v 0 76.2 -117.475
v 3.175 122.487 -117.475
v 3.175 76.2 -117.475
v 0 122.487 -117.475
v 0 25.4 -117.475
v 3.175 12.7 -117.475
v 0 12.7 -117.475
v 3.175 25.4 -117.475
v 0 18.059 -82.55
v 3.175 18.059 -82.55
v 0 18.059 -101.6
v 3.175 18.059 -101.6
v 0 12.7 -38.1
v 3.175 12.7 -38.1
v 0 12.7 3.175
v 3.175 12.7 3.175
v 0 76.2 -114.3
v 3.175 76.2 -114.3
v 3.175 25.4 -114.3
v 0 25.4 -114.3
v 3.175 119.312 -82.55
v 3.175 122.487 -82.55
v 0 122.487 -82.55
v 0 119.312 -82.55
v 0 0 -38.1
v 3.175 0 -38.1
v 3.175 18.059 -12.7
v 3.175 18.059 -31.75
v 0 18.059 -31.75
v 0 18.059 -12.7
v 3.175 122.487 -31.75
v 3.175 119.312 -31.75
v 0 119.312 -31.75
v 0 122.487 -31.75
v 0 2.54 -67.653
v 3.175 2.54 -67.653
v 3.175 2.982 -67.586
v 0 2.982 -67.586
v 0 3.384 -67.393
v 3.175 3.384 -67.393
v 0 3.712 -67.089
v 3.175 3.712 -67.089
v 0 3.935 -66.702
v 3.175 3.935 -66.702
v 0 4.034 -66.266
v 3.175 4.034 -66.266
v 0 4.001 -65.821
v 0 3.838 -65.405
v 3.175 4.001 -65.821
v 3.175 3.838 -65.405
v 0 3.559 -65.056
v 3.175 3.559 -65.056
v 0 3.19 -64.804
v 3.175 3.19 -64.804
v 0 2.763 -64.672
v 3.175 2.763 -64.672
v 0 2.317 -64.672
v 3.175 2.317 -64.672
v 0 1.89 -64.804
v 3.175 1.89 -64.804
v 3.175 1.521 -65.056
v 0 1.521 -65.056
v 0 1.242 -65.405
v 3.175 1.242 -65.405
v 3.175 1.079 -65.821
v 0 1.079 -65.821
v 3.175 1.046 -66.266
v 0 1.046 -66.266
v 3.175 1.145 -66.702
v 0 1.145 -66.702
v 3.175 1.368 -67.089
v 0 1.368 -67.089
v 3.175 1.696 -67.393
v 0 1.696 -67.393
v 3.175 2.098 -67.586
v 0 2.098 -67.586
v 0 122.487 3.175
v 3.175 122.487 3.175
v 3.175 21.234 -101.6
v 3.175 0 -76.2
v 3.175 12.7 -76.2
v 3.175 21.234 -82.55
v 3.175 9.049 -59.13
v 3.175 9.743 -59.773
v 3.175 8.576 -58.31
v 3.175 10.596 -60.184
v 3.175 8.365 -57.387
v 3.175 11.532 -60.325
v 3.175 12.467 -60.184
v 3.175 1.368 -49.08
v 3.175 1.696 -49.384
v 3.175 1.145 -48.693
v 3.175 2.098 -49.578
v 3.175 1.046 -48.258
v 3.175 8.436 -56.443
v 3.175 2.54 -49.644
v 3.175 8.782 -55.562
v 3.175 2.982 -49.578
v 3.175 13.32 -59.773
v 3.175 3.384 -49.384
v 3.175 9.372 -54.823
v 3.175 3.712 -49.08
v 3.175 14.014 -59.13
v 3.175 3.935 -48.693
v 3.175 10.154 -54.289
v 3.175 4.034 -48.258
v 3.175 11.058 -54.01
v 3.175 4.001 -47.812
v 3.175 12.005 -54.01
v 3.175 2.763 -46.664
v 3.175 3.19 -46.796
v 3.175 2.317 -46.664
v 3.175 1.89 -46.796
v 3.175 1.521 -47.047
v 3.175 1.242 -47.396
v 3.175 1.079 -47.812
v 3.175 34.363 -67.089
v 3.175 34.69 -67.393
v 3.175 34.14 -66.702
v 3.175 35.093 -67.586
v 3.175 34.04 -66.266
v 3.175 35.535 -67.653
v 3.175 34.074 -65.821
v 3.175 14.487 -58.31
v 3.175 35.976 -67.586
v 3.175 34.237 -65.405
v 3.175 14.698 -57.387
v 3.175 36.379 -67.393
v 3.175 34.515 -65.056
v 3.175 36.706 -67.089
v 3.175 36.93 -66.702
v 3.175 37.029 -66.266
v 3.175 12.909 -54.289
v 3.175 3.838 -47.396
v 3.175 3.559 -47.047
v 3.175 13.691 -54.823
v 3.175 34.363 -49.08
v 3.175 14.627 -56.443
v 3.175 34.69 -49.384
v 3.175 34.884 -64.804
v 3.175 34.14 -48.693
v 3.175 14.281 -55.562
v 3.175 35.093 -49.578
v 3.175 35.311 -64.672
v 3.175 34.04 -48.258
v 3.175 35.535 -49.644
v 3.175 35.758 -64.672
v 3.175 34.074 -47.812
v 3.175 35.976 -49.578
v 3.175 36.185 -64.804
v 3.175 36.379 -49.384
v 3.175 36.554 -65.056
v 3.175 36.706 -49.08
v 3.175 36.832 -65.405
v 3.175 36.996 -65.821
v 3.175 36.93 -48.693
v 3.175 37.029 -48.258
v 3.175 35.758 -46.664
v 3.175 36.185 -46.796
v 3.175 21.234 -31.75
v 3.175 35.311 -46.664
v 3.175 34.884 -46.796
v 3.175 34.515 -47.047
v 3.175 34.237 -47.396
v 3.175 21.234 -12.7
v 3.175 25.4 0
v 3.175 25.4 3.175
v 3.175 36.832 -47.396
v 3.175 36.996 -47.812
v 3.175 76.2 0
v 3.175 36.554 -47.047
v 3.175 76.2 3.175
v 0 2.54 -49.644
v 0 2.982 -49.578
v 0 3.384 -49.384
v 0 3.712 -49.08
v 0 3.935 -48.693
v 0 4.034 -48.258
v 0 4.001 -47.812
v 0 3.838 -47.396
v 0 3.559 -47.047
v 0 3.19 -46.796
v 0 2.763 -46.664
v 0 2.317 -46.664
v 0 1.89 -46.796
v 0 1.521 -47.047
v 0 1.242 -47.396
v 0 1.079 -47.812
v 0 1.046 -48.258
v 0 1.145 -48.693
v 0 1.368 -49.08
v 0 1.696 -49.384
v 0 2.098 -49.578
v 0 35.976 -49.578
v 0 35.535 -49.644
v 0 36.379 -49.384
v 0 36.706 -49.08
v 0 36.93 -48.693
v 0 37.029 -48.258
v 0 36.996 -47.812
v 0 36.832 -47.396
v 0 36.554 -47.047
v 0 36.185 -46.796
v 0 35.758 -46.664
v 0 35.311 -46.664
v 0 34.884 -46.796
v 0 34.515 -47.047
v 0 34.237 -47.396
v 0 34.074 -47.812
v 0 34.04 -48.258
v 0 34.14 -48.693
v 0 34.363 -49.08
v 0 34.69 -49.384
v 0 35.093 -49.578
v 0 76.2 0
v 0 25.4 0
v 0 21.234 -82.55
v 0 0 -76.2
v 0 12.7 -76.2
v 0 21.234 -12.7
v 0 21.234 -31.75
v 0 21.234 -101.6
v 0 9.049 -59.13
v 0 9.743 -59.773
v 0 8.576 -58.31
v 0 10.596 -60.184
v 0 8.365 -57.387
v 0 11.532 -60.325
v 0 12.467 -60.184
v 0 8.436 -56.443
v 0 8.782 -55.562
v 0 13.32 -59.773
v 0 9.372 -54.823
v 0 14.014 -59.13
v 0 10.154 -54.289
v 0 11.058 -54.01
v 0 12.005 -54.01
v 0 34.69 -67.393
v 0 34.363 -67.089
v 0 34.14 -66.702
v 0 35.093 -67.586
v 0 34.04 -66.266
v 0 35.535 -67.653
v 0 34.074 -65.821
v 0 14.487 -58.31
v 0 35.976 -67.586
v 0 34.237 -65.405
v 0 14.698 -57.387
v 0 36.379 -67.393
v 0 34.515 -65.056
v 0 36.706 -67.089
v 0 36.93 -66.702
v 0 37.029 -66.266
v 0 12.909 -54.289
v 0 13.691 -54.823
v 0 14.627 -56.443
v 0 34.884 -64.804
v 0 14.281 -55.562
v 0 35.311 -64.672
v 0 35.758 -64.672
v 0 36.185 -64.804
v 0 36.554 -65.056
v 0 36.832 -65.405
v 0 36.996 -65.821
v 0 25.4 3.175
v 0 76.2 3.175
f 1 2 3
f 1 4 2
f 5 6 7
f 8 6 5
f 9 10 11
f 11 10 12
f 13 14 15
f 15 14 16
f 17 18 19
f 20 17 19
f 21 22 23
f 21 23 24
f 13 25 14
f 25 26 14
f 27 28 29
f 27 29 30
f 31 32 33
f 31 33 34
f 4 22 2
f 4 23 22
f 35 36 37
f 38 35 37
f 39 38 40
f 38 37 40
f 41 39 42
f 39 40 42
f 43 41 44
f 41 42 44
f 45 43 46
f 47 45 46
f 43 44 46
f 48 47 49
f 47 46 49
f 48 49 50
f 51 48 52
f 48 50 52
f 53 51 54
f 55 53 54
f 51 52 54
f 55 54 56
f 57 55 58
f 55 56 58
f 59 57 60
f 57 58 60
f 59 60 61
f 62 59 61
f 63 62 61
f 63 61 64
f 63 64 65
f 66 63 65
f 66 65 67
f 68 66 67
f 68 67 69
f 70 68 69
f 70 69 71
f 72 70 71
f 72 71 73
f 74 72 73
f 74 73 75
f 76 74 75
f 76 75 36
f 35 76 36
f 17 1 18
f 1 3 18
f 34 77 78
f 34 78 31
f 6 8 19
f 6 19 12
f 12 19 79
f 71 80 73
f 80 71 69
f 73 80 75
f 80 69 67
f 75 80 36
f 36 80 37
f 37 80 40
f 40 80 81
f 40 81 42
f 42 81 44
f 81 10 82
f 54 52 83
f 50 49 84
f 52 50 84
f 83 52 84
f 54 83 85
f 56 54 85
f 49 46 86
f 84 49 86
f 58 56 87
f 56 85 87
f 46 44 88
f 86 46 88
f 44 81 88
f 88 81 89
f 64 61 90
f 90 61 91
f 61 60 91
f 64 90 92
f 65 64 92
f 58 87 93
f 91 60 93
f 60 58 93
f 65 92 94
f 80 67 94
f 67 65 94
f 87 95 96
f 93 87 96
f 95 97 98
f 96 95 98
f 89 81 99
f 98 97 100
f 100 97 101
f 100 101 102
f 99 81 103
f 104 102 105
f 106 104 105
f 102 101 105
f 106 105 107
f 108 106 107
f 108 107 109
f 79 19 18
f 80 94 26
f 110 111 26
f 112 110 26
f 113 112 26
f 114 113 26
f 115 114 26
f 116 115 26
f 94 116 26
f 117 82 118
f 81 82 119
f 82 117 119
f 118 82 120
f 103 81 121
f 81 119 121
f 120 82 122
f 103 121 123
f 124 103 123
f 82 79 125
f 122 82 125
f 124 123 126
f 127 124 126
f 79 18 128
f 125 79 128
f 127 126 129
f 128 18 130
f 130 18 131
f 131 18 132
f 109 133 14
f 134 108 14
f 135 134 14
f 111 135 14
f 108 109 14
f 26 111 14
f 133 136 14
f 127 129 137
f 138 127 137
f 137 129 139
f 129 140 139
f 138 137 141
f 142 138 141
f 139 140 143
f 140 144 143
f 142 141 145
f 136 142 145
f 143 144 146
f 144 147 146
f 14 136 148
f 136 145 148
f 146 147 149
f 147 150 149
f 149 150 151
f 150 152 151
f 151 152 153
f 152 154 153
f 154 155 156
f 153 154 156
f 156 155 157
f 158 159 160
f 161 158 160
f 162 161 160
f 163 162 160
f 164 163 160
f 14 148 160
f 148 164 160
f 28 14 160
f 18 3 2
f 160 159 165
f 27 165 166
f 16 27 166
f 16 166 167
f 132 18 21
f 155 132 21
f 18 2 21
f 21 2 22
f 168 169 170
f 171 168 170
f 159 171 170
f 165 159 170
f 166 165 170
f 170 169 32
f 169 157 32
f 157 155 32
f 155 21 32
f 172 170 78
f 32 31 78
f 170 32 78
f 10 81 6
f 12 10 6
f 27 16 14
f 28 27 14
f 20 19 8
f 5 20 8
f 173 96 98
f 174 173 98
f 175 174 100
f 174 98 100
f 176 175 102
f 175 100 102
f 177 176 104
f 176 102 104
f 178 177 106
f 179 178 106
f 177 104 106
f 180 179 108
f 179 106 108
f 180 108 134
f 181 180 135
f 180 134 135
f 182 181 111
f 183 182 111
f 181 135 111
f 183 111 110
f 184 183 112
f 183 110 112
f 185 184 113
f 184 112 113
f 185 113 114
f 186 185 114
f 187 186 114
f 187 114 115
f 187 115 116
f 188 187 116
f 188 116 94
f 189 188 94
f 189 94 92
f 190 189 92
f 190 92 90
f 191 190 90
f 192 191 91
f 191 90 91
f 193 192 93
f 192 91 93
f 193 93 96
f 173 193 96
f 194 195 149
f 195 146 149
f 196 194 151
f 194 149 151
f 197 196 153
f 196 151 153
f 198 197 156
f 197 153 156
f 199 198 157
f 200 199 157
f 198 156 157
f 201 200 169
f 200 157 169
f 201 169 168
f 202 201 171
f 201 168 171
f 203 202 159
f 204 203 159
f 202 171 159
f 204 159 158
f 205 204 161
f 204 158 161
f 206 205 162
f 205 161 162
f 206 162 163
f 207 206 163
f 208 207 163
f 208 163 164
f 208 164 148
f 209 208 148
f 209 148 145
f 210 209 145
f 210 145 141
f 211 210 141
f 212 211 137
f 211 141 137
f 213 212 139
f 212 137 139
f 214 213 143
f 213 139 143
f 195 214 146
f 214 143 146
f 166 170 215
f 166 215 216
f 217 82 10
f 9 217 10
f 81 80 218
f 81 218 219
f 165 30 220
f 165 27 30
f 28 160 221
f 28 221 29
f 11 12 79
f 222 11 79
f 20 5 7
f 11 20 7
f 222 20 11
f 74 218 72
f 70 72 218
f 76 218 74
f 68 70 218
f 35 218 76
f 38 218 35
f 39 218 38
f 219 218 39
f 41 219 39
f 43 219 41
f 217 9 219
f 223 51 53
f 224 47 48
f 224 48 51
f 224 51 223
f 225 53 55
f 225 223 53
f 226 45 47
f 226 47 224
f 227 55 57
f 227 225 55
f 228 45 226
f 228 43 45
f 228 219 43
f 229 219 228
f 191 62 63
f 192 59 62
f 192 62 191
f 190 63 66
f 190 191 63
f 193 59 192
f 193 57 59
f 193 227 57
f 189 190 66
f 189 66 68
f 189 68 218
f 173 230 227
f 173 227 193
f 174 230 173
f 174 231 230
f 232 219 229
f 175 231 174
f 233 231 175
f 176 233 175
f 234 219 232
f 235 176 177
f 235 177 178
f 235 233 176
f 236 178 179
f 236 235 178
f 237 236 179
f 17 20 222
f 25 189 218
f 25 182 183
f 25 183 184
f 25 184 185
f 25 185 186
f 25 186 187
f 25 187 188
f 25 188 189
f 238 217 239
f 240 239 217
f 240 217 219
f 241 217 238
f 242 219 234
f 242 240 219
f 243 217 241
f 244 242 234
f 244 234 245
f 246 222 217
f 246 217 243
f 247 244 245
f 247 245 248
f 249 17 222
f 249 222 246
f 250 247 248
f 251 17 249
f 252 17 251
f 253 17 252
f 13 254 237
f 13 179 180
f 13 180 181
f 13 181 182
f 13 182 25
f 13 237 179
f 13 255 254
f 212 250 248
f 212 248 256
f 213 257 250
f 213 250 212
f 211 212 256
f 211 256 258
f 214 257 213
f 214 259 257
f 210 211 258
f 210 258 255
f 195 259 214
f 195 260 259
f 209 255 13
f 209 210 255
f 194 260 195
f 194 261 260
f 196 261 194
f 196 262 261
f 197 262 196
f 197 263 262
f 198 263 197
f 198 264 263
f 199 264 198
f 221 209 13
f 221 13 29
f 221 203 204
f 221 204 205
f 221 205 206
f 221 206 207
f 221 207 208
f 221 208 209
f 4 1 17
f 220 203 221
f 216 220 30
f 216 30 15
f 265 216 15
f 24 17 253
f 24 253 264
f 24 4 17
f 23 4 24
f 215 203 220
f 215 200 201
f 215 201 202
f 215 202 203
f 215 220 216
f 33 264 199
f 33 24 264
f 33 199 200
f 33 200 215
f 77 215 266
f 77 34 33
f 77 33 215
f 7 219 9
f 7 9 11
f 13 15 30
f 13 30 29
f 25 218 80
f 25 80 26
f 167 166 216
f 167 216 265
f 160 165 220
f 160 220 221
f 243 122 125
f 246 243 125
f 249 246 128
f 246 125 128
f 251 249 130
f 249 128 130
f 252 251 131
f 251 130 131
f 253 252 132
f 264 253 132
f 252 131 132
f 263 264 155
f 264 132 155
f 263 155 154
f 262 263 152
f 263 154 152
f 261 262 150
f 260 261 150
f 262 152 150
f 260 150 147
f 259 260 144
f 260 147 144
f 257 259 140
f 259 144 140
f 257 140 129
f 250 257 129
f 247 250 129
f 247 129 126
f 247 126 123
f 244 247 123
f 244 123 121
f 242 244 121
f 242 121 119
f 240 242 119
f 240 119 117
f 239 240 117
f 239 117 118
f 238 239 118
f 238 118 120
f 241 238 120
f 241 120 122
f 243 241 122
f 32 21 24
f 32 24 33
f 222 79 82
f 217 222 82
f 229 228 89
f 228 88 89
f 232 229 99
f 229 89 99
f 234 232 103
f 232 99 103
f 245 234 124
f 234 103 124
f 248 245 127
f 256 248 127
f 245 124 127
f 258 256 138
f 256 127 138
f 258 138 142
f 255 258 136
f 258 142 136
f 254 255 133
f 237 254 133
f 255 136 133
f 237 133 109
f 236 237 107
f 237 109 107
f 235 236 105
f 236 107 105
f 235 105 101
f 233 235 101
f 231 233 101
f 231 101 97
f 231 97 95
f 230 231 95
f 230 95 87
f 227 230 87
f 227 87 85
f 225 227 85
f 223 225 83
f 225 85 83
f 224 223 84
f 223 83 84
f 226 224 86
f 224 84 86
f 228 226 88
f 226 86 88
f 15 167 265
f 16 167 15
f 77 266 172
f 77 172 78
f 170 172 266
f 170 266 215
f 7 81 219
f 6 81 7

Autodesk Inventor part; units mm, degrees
ref_plane "YZ Plane" through (0, 0, 0) normal (1, 0, 0) x (0, 1, 0)
ref_plane "XZ Plane" through (0, 0, 0) normal (0, 1, 0) x (-1, 0, 0)
ref_plane "XY Plane" through (0, 0, 0) normal (0, 0, 1) x (1, 0, 0)
sketch "Sketch1" plane through (0, 0, 0) normal (1, 0, 0) x (0, 1, 0)
  line L0 (0, 0) -> (97.4344, 0)
  line L1 (97.4344, 0) -> (97.4344, -114.3)
  line L2 (97.4344, -114.3) -> (0, -114.3)
  line L3 (0, -114.3) -> (0, 0)
  dimension "d0" = 114.3
  dimension "d1" = 97.4344
extrude "Extrusion1" add sketch "Sketch1" along normal blind 3.175
sketch "Sketch2" plane through (3.175, 0, 0) normal (1, 0, 0) x (0, 0, -1)
  circle A0 centre (48.1457, 35.5346) radius 1.4986
  circle A1 centre (66.1543, 35.5346) radius 1.4986
  circle A2 centre (66.1543, 2.54) radius 1.4986
  circle A3 centre (48.1457, 2.54) radius 1.4986
  line L0 (114.3, 0) -> (114.3, 97.4344) projected
  line L1 (0, 0) -> (114.3, 0) projected
  line L2 (0, 0) -> (0, 97.4344) projected
  dimension "d4" = 18.0086
  dimension "d5" = 2.9972
  dimension "d6" = 2.9972
  dimension "d7" = 2.9972
  dimension "d8" = 2.9972
  dimension "d11" = 18.0086
  dimension "d12" = 2.54
  dimension "d28" = 2.54
  dimension "d29" = 32.9946
  dimension "d30" = 32.9946
  dimension "d65" = 48.1457
extrude "Extrusion2" cut sketch "Sketch2" against normal blind 3.175
sketch "Sketch3" plane through (3.175, 0, 0) normal (1, 0, 0) x (0, 0, -1)
  circle A0 centre (57.15, 11.5316) radius 3.175
  line L0 (114.3, 0) -> (114.3, 97.4344) projected
  circle A1 centre (66.1543, 2.54) radius 1.4986 projected
  point P0 (0, 0)
  dimension "d15" = 6.35
  dimension "d16" = 57.15
  dimension "d17" = 8.9916
extrude "Extrusion3" cut sketch "Sketch3" against normal blind 3.175 contours A0
sketch "Sketch4" plane through (3.175, 0, 0) normal (1, 0, 0) x (0, 0, -1)
  line L0 (0, 97.4344) -> (0, 0) projected
  line L1 (0, 0) -> (114.3, 0) projected
  line L2 (114.3, 0) -> (114.3, 97.4344) projected
  line L3 (31.75, 18.0594) -> (12.7, 18.0594)
  line L4 (12.7, 18.0594) -> (12.7, 21.2344)
  line L5 (12.7, 21.2344) -> (31.75, 21.2344)
  line L6 (31.75, 21.2344) -> (31.75, 18.0594)
  circle A0 centre (57.15, 11.5316) radius 3.175 projected
  line L7 (57.15, 11.5316) -> (57.15, 79.1299) construction
  line L8 (82.55, 18.0594) -> (101.6, 18.0594)
  line L9 (101.6, 18.0594) -> (101.6, 21.2344)
  line L10 (101.6, 21.2344) -> (82.55, 21.2344)
  line L11 (82.55, 21.2344) -> (82.55, 18.0594)
  point P0 (12.7, 0)
  point P1 (31.75, 0)
  point P2 (101.6, 0)
  dimension "d31" = 3.175
  dimension "d33" = 19.05
  dimension "d34" = 12.7
  dimension "d43" = 18.0594
extrude "Extrusion5" cut sketch "Sketch4" against normal blind 3.175 contours L3 L4 L5 L6 | L11 L10 L9 L8
sketch "Sketch5" plane through (3.175, 0, 0) normal (1, 0, 0) x (0, 0, -1)
  line L0 (0, 0) -> (38.1, 0)
  line L1 (38.1, 0) -> (38.1, 12.7)
  line L2 (38.1, 12.7) -> (0, 12.7)
  line L3 (0, 12.7) -> (0, 0)
  line L4 (114.3, 0) -> (0, 0) projected
  line L5 (114.3, 0) -> (76.2, 0)
  line L6 (76.2, 0) -> (76.2, 12.7)
  line L7 (76.2, 12.7) -> (114.3, 12.7)
  line L8 (114.3, 12.7) -> (114.3, 0)
  dimension "d37" = 38.1
  dimension "d38" = 12.7
  dimension "d39" = 38.1
  dimension "d42" = 12.7
extrude "Extrusion6" cut sketch "Sketch5" against normal blind 3.175
sketch "Sketch6" plane through (3.175, 0, 0) normal (1, 0, 0) x (0, 0, -1)
  line L0 (0, 97.4344) -> (0, 12.7) projected
  line L1 (0, 69.85) -> (3.175, 69.85)
  line L2 (3.175, 69.85) -> (3.175, 50.8)
  line L3 (3.175, 50.8) -> (0, 50.8)
  line L4 (0, 50.8) -> (0, 69.85)
  line L5 (0, 12.7) -> (38.1, 12.7) projected
  line L6 (38.1, 0) -> (76.2, 0) projected
  line L7 (57.15, 0) -> (57.15, 76.8026) construction
  line L8 (114.3, 97.4344) -> (114.3, 12.7)
  line L9 (114.3, 69.85) -> (111.125, 69.85)
  line L10 (111.125, 69.85) -> (111.125, 50.8)
  line L11 (111.125, 50.8) -> (114.3, 50.8)
  line L12 (114.3, 50.8) -> (114.3, 69.85)
  point P0 (0, 0)
  dimension "d44" = 38.1
  dimension "d45" = 19.05
  dimension "d46" = 3.175
extrude "Extrusion7" cut sketch "Sketch6" against normal blind 3.175
sketch "Sketch7" plane through (3.175, 0, 0) normal (1, 0, 0) x (0, 0, -1)
  line L0 (0, 101.4731) -> (-3.175, 101.4731)
  line L1 (-3.175, 101.4731) -> (-3.175, 12.7)
  line L2 (-3.175, 12.7) -> (0, 12.7)
  line L3 (0, 12.7) -> (0, 101.4731)
  line L4 (114.3, 50.8) -> (114.3, 12.7) projected
  line L5 (114.3, 12.7) -> (117.475, 12.7)
  line L6 (117.475, 12.7) -> (117.475, 101.4731)
  line L7 (117.475, 101.4731) -> (114.3, 101.4731)
  line L8 (114.3, 101.4731) -> (114.3, 12.7)
  line L9 (0, 97.4344) -> (0, 69.85) projected
  line L10 (0, 69.85) -> (3.3446, 69.85)
  line L11 (3.3446, 69.85) -> (3.3446, 50.8)
  line L12 (3.3446, 50.8) -> (0, 50.8)
  line L13 (0, 50.8) -> (0, 69.85)
  line L14 (111.125, 69.85) -> (111.125, 50.8) projected
  line L15 (111.125, 69.85) -> (114.3, 69.85)
  line L16 (114.3, 69.85) -> (114.3, 50.8)
  line L17 (114.3, 50.8) -> (111.125, 50.8)
  line L18 (111.125, 50.8) -> (111.125, 69.85)
  line L19 (0, 97.4344) -> (-3.175, 97.4344)
  line L20 (0, 97.4344) -> (114.3, 97.4344) projected
  line L21 (114.3, 97.4344) -> (117.475, 97.4344)
  point P0 (0, 0)
  dimension "d49" = 3.175
  dimension "d50" = 3.175
  dimension "d51" = 0
extrude "Extrusion8" add sketch "Sketch7" against normal blind 3.175
sketch "Sketch8" plane through (3.175, 0, 0) normal (1, 0, 0) x (0, 0, -1)
  line L0 (-3.175, 101.4731) -> (-3.175, 12.7) projected
  line L1 (-3.175, 76.2) -> (0, 76.2)
  line L2 (0, 76.2) -> (0, 25.4)
  line L3 (0, 25.4) -> (-3.175, 25.4)
  line L4 (-3.175, 25.4) -> (-3.175, 76.2)
  line L5 (117.475, 101.4731) -> (117.475, 12.7) projected
  line L6 (117.475, 76.2) -> (114.3, 76.2)
  line L7 (114.3, 76.2) -> (114.3, 25.4)
  line L8 (114.3, 25.4) -> (117.475, 25.4)
  line L9 (117.475, 25.4) -> (117.475, 76.2)
  line L10 (-3.175, 12.7) -> (38.1, 12.7) projected
  point P0 (0, 0)
  dimension "d54" = 3.175
  dimension "d55" = 3.175
  dimension "d56" = 50.8
  dimension "d57" = 50.8
  dimension "d58" = 12.7
extrude "Extrusion9" cut sketch "Sketch8" against normal blind 3.175
sketch "Sketch9" plane through (3.175, 0, 0) normal (1, 0, 0) x (0, 0, -1)
  line L0 (-3.175, 76.2) -> (-3.175, 101.4731) projected
  line L1 (-3.175, 97.0871) -> (127.7131, 97.0871)
  line L2 (127.7131, 97.0871) -> (127.7131, 110.1997)
  line L3 (127.7131, 110.1997) -> (-3.175, 110.1997)
  line L4 (-3.175, 110.1997) -> (-3.175, 97.0871)
  point P0 (0, 0)
extrude "Extrusion10" cut sketch "Sketch9" against normal blind 3.175
sketch "Sketch10" plane through (0, 0, 0) normal (-1, 0, 0) x (0, 0, 1)
  line L0 (-117.475, 97.0871) -> (-117.475, 76.2) projected
  line L1 (-117.475, 97.0871) -> (3.175, 97.0871)
  line L2 (3.175, 97.0871) -> (3.175, 122.4871)
  line L3 (3.175, 122.4871) -> (-117.475, 122.4871)
  line L4 (-117.475, 122.4871) -> (-117.475, 97.0871)
  line L5 (3.175, 76.2) -> (3.175, 97.0871) projected
  point P0 (0, 0)
  dimension "d66" = 0
  dimension "d67" = 25.4
extrude "Extrusion11" add sketch "Sketch10" against normal blind 3.175
sketch "Sketch11" plane through (3.175, 0, 0) normal (1, 0, 0) x (0, 0, -1)
  line L0 (117.475, 122.4871) -> (-3.175, 122.4871) projected
  line L1 (31.75, 122.4871) -> (82.55, 122.4871)
  line L2 (82.55, 122.4871) -> (82.55, 119.3121)
  line L3 (82.55, 119.3121) -> (31.75, 119.3121)
  line L4 (31.75, 119.3121) -> (31.75, 122.4871)
  line L5 (-3.175, 122.4871) -> (-3.175, 76.2) projected
  point P0 (0, 0)
  dimension "d70" = 50.8
  dimension "d71" = 3.175
  dimension "d72" = 34.925
extrude "Extrusion12" cut sketch "Sketch11" against normal blind 3.175
properties part number "side"
